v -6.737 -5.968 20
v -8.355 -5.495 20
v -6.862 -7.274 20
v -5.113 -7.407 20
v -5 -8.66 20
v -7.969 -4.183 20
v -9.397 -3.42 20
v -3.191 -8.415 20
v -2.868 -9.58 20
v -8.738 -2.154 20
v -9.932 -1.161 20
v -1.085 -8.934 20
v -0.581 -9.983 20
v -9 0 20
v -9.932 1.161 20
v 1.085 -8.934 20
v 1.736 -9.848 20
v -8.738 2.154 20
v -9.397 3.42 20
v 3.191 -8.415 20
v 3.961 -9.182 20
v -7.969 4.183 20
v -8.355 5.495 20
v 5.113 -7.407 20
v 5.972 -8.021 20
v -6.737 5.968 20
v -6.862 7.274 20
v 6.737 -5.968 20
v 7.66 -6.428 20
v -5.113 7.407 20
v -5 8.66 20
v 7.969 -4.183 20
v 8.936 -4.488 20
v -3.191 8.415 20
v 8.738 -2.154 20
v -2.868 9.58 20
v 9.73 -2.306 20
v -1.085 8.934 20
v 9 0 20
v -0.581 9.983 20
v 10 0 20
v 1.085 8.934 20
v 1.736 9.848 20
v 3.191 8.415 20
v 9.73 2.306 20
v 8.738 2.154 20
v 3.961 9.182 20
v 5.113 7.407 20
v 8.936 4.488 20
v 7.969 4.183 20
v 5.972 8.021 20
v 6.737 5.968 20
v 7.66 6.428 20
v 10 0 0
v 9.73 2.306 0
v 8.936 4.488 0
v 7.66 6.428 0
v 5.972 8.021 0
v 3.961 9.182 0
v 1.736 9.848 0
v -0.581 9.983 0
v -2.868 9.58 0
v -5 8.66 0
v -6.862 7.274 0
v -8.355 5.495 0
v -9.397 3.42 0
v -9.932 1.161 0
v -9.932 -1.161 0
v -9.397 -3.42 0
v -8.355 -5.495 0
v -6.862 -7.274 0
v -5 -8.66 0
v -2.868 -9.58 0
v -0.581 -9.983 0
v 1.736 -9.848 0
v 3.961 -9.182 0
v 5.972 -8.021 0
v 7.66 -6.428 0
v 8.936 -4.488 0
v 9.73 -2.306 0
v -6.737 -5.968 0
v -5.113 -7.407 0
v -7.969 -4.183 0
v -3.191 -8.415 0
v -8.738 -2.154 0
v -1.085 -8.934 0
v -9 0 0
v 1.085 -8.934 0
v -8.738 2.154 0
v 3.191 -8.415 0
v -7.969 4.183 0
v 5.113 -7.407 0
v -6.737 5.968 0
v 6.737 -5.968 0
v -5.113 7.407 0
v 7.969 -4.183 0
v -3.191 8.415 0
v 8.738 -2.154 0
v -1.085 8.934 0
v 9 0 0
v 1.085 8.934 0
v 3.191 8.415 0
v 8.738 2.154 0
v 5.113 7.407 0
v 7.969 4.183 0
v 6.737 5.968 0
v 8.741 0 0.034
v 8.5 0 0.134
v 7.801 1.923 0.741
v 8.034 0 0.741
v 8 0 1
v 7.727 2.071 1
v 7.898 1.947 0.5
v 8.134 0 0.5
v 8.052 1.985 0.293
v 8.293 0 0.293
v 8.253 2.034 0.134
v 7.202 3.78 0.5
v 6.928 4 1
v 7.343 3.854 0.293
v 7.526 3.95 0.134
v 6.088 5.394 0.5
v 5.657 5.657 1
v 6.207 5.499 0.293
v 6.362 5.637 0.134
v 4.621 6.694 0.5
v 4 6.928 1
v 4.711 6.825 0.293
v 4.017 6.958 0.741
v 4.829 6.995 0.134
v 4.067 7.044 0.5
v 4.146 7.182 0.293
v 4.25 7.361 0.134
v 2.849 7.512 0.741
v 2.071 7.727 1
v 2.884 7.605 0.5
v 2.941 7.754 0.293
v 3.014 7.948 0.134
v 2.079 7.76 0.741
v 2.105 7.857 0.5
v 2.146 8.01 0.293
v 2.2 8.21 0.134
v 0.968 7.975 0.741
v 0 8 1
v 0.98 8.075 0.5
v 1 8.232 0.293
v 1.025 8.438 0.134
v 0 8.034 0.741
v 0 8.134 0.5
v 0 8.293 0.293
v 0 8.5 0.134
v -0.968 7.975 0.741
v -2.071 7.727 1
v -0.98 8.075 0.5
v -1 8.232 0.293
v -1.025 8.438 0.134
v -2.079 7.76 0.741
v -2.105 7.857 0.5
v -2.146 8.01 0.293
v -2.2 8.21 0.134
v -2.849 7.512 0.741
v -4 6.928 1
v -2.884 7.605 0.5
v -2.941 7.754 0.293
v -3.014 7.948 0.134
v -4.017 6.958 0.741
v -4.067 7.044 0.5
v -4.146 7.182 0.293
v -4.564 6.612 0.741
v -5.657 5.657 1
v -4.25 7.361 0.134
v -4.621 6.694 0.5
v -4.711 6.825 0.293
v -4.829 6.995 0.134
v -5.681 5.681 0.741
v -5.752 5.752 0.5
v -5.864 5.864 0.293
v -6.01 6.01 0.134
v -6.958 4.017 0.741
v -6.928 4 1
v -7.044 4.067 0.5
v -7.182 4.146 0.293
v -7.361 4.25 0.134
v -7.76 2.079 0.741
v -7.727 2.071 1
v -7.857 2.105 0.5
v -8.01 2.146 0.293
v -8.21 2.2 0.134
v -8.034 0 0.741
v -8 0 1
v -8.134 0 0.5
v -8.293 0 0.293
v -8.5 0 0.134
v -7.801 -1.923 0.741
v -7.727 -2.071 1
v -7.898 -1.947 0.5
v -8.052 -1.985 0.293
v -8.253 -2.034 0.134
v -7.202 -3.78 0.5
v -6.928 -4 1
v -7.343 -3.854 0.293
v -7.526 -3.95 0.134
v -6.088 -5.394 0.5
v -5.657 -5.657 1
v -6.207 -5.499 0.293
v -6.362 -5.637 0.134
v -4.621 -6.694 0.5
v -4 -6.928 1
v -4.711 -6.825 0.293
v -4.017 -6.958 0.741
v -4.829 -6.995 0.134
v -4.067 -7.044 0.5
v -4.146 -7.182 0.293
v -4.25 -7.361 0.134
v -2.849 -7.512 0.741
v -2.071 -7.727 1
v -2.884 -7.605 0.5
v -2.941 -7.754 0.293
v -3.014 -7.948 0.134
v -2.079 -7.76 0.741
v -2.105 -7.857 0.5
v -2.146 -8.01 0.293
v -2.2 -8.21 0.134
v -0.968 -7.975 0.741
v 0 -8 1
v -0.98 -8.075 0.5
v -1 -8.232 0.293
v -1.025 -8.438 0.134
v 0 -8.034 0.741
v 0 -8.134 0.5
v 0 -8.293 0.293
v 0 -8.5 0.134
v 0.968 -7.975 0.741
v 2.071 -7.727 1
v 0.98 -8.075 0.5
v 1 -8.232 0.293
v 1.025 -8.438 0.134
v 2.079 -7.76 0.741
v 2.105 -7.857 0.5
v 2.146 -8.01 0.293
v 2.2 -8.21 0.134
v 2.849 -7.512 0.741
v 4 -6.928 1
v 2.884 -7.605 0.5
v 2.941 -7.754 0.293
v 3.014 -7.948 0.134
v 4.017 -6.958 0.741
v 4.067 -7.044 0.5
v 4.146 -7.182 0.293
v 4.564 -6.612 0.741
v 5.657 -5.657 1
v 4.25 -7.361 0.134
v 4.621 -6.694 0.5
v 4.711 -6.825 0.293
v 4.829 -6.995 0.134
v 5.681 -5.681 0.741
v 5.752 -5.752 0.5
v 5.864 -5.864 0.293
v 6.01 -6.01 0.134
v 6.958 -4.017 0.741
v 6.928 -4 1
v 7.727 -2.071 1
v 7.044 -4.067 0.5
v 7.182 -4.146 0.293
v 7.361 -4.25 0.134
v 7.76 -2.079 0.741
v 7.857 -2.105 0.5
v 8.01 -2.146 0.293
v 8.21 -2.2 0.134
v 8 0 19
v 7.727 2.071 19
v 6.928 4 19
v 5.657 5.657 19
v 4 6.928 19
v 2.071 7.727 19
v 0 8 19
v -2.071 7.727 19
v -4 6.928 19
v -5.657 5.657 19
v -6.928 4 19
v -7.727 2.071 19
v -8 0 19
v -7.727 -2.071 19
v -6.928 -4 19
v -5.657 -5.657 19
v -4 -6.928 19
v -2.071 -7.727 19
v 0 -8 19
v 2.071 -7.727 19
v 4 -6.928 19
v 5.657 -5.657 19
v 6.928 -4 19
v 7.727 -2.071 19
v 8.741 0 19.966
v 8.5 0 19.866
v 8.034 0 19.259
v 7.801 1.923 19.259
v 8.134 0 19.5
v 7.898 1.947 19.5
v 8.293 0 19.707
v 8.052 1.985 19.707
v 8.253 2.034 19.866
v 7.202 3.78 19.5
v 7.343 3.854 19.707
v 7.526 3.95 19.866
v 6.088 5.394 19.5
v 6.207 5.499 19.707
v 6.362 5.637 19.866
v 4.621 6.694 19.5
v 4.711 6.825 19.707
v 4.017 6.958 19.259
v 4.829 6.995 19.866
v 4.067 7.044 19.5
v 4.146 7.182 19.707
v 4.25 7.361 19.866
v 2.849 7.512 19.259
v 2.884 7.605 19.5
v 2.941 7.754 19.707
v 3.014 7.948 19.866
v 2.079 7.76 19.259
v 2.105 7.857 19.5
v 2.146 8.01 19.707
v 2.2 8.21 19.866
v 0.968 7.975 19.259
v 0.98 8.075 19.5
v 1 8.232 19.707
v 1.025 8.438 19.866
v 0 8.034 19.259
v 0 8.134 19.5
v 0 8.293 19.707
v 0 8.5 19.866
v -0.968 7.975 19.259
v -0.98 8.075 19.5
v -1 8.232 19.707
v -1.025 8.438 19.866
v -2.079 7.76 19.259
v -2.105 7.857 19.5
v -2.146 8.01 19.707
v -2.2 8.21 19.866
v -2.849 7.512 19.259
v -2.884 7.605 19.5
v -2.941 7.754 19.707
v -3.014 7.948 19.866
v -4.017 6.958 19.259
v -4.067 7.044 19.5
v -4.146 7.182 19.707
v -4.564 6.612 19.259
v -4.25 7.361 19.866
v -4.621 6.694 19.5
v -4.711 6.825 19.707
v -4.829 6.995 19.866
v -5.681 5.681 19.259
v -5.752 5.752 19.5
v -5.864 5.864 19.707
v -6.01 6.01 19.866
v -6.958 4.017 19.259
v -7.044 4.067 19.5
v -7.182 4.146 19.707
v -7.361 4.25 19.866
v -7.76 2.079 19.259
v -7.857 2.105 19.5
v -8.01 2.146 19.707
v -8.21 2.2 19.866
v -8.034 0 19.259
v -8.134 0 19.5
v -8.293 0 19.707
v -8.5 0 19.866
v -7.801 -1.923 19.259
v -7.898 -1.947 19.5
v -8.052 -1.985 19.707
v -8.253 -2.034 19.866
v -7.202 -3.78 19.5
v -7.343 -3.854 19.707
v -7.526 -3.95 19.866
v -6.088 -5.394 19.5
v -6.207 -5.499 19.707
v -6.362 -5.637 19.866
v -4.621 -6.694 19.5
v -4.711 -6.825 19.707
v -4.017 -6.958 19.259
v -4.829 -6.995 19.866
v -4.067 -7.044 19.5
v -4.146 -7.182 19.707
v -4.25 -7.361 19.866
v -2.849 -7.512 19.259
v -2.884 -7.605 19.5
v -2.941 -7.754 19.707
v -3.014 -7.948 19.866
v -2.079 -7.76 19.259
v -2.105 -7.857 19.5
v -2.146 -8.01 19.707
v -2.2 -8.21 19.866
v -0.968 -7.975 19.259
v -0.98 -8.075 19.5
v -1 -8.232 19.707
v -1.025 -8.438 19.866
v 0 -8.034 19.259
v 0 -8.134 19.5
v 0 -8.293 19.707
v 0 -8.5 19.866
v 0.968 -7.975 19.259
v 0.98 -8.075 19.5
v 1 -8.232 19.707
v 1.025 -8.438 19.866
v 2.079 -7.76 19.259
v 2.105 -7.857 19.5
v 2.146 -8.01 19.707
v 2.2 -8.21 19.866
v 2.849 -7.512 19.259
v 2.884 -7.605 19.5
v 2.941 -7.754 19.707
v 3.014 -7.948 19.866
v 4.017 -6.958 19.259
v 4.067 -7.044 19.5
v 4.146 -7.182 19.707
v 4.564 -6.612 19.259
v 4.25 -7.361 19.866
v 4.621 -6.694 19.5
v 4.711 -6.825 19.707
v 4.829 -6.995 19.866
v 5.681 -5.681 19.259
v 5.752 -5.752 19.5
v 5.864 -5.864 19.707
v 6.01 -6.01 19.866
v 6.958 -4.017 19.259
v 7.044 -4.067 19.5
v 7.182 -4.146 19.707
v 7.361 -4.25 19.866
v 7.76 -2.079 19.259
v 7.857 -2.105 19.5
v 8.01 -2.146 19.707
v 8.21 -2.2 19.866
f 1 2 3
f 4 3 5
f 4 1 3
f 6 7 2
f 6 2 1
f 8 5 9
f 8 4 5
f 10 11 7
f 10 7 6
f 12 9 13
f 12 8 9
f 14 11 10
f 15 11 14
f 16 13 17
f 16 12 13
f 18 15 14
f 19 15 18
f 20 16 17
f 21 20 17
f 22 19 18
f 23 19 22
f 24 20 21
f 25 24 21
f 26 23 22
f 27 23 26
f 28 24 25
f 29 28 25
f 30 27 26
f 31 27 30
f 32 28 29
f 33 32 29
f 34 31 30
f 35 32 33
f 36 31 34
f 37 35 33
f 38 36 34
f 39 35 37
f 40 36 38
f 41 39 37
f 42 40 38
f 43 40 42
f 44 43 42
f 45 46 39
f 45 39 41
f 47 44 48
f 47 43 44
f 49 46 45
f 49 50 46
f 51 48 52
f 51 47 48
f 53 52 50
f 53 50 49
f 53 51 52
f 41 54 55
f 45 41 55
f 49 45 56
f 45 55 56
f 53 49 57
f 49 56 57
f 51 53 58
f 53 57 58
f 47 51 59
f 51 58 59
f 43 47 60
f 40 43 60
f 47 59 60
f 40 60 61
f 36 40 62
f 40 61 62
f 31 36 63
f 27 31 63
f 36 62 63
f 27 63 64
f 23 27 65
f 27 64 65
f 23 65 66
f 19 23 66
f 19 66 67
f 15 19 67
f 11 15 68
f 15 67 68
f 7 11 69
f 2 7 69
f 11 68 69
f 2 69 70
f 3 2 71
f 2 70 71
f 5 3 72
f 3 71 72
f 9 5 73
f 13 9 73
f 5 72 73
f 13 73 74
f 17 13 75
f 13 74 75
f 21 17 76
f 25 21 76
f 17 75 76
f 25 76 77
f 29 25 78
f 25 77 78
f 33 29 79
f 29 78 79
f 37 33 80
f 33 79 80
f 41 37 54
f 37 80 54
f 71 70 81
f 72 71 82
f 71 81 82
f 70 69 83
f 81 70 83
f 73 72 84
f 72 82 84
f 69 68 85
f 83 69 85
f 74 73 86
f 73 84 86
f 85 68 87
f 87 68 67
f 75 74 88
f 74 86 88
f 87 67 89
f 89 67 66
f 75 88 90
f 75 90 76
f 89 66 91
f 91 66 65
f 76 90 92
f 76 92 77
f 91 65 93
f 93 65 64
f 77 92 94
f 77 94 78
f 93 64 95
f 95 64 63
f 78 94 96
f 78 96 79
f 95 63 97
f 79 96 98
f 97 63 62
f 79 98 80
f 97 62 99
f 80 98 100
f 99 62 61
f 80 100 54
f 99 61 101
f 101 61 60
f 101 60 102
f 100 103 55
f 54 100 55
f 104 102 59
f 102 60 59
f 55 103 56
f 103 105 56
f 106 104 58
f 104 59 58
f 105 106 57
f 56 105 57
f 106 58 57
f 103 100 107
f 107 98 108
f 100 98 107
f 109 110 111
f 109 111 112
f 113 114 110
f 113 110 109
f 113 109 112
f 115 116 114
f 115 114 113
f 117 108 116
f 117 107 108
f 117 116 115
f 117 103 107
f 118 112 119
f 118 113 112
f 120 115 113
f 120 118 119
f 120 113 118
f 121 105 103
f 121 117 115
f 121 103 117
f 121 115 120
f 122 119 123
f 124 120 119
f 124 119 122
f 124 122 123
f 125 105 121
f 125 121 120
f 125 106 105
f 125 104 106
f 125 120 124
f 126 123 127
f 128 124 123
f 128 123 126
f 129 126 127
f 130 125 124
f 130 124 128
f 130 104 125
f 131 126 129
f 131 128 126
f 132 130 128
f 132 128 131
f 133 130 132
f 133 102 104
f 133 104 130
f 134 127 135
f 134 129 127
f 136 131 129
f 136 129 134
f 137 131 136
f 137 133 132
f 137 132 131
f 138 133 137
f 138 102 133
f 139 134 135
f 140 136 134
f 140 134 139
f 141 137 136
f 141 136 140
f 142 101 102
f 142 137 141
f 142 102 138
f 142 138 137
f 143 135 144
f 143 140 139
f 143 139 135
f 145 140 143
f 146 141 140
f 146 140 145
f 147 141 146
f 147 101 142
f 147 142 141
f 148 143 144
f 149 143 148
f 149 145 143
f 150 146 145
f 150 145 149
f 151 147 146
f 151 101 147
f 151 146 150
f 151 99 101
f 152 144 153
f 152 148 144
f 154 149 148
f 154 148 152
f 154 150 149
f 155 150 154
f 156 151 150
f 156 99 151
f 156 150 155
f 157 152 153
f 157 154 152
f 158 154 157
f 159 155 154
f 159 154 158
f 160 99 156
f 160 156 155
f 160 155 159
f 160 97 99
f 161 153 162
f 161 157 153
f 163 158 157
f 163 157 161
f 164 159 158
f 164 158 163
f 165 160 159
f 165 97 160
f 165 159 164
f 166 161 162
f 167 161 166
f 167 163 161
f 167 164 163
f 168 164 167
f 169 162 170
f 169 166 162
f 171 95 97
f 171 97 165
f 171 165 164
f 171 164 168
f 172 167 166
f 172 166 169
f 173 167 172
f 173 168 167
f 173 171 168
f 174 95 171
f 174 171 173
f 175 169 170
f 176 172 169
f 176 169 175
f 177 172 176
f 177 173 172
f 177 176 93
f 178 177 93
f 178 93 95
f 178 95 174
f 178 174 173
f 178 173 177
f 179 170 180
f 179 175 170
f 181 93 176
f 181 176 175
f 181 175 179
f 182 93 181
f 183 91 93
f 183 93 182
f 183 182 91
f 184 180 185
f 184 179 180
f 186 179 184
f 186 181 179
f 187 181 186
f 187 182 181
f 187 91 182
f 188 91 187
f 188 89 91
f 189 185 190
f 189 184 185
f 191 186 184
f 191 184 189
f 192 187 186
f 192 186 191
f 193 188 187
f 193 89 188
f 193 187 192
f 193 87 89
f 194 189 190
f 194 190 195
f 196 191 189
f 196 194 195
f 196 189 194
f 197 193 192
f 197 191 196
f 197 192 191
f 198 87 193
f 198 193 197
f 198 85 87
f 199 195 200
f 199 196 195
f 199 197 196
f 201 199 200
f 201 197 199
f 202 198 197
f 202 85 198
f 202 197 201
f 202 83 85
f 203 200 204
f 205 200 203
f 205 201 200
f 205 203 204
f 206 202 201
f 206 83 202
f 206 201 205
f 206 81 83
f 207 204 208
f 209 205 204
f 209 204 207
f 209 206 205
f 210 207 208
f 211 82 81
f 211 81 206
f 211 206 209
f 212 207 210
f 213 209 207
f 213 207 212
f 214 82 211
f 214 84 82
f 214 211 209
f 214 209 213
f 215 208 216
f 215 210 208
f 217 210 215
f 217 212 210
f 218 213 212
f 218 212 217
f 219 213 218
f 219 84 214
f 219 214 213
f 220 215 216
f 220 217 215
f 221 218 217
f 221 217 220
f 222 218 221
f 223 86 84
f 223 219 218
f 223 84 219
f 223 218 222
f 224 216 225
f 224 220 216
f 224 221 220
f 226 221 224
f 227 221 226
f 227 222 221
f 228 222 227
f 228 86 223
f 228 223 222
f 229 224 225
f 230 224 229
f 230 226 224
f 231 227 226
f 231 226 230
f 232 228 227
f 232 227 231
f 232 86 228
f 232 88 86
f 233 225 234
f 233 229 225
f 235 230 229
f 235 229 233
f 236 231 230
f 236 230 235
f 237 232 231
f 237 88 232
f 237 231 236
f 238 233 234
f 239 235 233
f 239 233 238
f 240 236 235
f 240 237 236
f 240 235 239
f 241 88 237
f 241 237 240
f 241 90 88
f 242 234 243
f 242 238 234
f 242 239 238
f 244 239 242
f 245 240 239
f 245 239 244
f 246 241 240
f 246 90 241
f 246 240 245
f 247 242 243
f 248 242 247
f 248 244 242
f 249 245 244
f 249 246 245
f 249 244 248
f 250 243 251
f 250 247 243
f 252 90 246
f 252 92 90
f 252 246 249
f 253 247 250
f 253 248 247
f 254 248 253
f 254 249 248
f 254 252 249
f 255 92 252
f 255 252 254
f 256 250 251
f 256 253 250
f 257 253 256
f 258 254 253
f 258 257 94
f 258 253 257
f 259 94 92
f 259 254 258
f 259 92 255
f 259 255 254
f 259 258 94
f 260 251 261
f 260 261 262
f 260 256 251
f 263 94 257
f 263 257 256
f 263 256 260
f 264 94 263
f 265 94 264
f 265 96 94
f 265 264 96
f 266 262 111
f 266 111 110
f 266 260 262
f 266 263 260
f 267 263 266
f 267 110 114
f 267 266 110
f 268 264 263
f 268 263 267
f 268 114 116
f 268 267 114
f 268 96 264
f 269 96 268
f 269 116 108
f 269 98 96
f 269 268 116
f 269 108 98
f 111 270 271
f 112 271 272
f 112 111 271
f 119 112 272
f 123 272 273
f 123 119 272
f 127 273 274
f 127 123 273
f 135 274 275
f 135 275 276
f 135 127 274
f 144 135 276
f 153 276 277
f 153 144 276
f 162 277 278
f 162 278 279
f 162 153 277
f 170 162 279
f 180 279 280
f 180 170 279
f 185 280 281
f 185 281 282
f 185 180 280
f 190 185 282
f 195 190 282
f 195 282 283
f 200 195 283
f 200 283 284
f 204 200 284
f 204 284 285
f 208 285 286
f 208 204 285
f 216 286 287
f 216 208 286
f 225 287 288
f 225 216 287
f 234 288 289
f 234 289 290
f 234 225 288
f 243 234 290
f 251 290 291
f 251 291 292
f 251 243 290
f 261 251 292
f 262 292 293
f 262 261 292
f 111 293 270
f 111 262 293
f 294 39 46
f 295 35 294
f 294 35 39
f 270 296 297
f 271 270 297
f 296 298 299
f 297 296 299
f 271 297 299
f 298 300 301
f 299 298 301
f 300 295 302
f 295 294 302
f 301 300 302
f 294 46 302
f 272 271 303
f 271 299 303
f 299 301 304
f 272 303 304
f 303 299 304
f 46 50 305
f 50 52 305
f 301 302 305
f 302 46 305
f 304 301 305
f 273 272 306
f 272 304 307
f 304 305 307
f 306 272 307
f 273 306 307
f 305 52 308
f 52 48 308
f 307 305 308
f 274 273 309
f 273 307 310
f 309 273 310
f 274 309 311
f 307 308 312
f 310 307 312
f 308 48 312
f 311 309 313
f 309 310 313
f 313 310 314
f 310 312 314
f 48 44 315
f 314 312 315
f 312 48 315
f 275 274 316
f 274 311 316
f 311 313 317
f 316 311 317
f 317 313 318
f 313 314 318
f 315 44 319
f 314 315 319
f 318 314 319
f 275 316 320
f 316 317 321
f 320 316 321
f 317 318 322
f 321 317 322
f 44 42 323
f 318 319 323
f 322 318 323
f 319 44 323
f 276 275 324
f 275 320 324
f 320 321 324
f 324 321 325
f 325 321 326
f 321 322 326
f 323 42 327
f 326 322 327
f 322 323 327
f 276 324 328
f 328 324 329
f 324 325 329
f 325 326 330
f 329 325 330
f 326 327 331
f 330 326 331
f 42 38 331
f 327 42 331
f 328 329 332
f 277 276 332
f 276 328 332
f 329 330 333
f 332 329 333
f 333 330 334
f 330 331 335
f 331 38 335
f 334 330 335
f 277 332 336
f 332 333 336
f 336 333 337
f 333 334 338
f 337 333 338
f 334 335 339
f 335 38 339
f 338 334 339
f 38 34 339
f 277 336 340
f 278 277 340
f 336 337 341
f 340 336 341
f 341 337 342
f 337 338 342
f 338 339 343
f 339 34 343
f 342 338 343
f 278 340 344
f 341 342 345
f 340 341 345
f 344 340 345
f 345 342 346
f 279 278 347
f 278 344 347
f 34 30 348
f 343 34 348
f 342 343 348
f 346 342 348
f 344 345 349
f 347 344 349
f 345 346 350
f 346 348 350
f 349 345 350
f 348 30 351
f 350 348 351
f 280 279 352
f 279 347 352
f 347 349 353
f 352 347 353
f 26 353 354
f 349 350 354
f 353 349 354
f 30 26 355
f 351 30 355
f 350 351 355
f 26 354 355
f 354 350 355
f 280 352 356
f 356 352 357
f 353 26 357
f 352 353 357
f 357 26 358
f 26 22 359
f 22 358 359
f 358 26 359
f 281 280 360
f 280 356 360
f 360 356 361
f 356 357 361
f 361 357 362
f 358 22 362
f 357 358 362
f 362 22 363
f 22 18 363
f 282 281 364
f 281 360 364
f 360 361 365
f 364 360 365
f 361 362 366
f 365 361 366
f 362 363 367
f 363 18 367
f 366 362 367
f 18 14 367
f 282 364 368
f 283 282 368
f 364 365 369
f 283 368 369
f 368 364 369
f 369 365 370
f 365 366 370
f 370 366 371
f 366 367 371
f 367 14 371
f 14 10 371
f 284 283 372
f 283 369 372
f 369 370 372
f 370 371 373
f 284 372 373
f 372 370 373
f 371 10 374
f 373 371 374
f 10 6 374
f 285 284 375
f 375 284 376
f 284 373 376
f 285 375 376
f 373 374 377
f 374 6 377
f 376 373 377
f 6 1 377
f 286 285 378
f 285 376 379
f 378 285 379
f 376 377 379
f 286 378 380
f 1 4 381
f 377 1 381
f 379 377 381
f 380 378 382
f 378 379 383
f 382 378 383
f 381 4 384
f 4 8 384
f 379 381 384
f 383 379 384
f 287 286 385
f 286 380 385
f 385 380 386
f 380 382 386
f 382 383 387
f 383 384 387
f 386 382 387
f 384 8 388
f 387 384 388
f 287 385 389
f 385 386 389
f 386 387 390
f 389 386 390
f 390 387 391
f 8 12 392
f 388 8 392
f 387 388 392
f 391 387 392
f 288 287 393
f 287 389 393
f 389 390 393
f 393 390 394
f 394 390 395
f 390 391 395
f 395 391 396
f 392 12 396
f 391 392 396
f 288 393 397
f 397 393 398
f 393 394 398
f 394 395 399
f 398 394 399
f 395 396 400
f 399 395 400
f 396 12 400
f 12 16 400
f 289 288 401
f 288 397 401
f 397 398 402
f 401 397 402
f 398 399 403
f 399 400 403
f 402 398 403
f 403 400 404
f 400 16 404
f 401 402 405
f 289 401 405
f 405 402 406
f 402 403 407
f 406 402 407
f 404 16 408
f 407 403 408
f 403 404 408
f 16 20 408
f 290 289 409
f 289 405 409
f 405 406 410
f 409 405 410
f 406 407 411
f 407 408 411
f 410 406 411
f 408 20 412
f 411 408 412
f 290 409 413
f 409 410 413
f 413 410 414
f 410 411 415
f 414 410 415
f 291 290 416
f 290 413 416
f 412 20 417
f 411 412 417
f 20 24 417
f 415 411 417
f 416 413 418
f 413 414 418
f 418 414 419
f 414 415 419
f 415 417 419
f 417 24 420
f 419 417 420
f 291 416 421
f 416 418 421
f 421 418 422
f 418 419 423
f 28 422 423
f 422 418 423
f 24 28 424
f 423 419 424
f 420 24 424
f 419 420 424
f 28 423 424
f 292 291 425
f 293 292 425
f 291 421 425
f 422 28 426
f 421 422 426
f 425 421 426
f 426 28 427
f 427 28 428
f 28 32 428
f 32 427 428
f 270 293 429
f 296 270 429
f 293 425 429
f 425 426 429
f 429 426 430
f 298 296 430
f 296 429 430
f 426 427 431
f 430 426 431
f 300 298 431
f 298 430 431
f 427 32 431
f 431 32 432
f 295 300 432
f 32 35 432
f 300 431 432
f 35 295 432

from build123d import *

# Parameters (mm, degrees)
F2_R     = 10
F2_R_2   = 8
F3_DEPTH = 20
F4_R     = 1
F5_R     = 1


with BuildPart() as f3:
    # F2 (on Top) → F3 (new body)
    with BuildSketch(Plane.XY):
        Circle(F2_R)
        Circle(F2_R_2, mode=Mode.SUBTRACT)
    extrude(amount=F3_DEPTH)

    # F4
    f4_edges = [f3.edges().sort_by_distance(p)[0] for p in [
        (-8, 0, 20),
    ]]
    fillet(f4_edges, radius=F4_R)

    # F5
    f5_edges = [f3.edges().sort_by_distance(p)[0] for p in [
        (-8, 0, 0),
    ]]
    fillet(f5_edges, radius=F5_R)


solid = f3.part
